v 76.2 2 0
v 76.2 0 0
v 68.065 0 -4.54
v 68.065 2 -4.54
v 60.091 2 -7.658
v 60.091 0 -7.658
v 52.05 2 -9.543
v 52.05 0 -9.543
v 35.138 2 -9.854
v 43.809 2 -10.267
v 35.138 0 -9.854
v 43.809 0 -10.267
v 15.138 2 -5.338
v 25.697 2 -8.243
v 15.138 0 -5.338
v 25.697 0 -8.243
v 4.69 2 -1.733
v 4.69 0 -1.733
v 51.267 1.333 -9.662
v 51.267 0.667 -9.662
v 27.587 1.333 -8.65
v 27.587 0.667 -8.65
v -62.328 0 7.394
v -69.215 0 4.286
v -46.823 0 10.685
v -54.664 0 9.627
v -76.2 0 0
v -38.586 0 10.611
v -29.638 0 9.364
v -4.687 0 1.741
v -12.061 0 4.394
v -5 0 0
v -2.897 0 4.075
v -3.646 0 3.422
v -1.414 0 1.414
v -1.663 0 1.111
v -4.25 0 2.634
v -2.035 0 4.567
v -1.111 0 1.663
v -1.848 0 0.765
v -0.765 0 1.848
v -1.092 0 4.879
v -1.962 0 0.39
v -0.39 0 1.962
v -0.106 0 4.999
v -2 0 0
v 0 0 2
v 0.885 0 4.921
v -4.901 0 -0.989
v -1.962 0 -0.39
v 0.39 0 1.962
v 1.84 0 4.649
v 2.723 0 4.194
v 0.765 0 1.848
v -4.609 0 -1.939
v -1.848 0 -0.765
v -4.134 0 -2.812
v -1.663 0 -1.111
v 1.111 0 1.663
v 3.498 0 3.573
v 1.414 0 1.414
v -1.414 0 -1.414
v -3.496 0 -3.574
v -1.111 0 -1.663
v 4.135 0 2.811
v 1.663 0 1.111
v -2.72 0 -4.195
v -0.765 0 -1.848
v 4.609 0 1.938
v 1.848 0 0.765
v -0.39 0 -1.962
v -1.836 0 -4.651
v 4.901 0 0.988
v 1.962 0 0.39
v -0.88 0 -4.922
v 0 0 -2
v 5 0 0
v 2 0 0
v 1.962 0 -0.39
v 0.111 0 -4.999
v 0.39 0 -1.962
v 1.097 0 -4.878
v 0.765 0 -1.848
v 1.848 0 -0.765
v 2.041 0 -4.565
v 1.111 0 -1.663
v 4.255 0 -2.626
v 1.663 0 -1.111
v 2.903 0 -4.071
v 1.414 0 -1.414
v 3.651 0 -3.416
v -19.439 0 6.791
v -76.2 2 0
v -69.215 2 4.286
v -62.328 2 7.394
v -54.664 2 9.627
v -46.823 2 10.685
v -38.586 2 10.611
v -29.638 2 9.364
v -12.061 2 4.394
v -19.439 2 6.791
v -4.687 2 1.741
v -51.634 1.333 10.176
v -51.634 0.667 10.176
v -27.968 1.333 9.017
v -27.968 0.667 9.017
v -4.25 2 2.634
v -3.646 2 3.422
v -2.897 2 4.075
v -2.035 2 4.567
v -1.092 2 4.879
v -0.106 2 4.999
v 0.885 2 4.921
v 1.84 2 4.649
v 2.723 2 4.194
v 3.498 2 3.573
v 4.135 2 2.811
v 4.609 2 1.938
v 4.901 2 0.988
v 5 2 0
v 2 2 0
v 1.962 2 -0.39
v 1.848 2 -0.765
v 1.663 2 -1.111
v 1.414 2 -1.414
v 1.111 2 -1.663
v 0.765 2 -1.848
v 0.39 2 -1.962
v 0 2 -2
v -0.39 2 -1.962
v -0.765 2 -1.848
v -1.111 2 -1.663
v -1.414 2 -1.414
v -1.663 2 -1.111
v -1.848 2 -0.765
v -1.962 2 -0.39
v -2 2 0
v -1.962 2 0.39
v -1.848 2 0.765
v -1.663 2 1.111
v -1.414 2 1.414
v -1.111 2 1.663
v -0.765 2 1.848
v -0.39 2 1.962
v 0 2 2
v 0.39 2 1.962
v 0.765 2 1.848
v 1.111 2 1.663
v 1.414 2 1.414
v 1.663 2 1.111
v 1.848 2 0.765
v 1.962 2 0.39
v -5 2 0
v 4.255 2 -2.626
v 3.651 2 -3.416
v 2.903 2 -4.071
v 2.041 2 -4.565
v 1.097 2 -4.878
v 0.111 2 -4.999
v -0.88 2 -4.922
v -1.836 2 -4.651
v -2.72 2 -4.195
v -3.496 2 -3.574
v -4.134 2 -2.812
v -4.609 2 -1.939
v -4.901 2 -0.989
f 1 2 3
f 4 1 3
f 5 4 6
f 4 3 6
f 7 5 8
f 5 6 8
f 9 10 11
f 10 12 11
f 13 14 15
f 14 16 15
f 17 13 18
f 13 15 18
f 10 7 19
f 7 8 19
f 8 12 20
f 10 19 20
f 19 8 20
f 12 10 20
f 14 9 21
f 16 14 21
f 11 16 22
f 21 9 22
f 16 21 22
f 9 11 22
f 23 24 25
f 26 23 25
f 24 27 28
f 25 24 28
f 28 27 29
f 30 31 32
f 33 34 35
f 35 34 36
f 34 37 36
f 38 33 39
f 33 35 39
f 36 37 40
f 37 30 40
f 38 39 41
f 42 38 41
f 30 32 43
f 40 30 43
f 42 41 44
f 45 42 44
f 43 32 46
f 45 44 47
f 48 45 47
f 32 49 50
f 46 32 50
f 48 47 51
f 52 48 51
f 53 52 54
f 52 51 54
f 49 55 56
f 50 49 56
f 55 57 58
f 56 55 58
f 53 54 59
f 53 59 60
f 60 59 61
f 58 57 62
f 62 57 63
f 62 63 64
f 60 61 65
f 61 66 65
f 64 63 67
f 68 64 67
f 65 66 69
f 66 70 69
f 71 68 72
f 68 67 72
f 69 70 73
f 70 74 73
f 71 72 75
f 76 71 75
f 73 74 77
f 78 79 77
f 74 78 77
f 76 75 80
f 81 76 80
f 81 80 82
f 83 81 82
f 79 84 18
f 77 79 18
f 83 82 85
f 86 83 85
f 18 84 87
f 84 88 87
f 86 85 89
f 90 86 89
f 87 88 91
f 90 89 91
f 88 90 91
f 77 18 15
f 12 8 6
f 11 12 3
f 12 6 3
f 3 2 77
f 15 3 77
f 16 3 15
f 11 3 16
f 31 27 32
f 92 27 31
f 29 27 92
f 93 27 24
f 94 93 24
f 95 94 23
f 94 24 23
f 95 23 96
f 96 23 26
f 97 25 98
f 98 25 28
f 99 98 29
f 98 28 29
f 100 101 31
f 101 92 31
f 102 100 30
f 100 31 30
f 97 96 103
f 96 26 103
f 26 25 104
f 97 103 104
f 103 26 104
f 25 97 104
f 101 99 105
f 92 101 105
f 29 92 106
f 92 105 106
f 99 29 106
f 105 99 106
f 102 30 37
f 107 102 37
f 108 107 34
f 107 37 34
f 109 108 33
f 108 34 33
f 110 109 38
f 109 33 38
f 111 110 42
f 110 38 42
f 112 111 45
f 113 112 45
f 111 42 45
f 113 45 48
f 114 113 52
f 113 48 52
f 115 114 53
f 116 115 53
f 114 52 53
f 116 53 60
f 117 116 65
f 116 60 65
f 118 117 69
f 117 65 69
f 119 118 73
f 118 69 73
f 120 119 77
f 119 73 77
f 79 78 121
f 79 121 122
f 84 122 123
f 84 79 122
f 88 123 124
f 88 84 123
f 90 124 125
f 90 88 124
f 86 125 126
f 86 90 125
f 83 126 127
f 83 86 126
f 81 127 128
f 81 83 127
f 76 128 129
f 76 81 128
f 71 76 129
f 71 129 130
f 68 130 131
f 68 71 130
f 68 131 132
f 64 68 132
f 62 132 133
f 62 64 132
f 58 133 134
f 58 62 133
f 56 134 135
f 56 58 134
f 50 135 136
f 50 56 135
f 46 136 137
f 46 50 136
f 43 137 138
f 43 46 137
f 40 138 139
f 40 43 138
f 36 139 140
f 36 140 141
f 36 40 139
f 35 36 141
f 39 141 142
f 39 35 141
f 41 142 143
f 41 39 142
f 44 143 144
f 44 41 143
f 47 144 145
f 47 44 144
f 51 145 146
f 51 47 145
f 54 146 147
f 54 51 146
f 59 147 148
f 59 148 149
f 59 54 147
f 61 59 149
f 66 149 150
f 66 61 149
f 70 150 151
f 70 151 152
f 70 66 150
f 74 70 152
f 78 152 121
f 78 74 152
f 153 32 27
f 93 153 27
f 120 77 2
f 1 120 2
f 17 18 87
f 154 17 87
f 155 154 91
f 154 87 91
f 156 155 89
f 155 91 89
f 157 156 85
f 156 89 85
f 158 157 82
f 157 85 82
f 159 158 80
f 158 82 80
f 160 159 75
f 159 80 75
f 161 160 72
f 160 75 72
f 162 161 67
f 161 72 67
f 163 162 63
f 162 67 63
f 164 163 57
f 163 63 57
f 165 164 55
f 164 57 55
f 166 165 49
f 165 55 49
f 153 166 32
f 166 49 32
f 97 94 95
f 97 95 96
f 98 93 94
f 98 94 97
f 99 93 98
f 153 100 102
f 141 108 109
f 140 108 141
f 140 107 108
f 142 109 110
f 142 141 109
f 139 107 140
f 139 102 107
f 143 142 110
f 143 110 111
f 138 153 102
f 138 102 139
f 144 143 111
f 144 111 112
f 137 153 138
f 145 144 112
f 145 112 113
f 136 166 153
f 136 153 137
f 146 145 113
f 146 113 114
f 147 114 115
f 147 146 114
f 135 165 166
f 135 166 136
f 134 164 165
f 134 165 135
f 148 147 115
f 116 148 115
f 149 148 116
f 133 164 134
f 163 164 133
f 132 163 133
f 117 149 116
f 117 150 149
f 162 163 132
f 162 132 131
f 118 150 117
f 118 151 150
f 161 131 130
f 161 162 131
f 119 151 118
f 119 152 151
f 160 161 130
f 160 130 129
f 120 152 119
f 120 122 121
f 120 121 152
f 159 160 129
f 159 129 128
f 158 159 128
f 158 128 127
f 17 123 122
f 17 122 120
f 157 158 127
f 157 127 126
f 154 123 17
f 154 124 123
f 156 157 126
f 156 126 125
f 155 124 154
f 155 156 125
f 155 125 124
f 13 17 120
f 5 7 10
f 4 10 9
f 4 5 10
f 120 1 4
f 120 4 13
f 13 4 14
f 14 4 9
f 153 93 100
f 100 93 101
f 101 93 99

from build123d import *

# Parameters (mm, degrees)
ESQUISSE2_R        = 2
BOSS_EXTRU_1_DEPTH = 2


with BuildPart() as part:
    # Esquisse2 → Boss.-Extru.1 (new body)
    with BuildSketch(Plane(origin=(0, 0, 0), x_dir=(1, 0, 0), z_dir=(0, 1, 0))):
        with BuildLine():
            Line((5, 0), (76.2, 0))
            add(Edge.make_bspline(
                [(76.2, 0), (50.48496799, 16.589800369), (27.351766227, 10.012035882), (4.69008689, 1.732941131)],
                knots=[0.538892618, 0.538892618, 0.538892618, 0.538892618, 1, 1, 1, 1], degree=3))
            ThreePointArc((4.69008689, 1.732941131), (-0.880217459, 4.921911948), (-5, 0))
            Line((-5, 0), (-76.2, 0))
            add(Edge.make_bspline(
                [(-76.2, 0), (-51.013872042, -17.583290738), (-27.945849526, -10.334640761), (-4.686924988, -1.741474708)],
                knots=[0, 0, 0, 0, 0.475147649, 0.475147649, 0.475147649, 0.475147649], degree=3))
            ThreePointArc((-4.686924988, -1.741474708), (0.884696293, -4.921108866), (5, 0))
        make_face()
        Circle(ESQUISSE2_R, mode=Mode.SUBTRACT)
    extrude(amount=BOSS_EXTRU_1_DEPTH)


solid = part.part
